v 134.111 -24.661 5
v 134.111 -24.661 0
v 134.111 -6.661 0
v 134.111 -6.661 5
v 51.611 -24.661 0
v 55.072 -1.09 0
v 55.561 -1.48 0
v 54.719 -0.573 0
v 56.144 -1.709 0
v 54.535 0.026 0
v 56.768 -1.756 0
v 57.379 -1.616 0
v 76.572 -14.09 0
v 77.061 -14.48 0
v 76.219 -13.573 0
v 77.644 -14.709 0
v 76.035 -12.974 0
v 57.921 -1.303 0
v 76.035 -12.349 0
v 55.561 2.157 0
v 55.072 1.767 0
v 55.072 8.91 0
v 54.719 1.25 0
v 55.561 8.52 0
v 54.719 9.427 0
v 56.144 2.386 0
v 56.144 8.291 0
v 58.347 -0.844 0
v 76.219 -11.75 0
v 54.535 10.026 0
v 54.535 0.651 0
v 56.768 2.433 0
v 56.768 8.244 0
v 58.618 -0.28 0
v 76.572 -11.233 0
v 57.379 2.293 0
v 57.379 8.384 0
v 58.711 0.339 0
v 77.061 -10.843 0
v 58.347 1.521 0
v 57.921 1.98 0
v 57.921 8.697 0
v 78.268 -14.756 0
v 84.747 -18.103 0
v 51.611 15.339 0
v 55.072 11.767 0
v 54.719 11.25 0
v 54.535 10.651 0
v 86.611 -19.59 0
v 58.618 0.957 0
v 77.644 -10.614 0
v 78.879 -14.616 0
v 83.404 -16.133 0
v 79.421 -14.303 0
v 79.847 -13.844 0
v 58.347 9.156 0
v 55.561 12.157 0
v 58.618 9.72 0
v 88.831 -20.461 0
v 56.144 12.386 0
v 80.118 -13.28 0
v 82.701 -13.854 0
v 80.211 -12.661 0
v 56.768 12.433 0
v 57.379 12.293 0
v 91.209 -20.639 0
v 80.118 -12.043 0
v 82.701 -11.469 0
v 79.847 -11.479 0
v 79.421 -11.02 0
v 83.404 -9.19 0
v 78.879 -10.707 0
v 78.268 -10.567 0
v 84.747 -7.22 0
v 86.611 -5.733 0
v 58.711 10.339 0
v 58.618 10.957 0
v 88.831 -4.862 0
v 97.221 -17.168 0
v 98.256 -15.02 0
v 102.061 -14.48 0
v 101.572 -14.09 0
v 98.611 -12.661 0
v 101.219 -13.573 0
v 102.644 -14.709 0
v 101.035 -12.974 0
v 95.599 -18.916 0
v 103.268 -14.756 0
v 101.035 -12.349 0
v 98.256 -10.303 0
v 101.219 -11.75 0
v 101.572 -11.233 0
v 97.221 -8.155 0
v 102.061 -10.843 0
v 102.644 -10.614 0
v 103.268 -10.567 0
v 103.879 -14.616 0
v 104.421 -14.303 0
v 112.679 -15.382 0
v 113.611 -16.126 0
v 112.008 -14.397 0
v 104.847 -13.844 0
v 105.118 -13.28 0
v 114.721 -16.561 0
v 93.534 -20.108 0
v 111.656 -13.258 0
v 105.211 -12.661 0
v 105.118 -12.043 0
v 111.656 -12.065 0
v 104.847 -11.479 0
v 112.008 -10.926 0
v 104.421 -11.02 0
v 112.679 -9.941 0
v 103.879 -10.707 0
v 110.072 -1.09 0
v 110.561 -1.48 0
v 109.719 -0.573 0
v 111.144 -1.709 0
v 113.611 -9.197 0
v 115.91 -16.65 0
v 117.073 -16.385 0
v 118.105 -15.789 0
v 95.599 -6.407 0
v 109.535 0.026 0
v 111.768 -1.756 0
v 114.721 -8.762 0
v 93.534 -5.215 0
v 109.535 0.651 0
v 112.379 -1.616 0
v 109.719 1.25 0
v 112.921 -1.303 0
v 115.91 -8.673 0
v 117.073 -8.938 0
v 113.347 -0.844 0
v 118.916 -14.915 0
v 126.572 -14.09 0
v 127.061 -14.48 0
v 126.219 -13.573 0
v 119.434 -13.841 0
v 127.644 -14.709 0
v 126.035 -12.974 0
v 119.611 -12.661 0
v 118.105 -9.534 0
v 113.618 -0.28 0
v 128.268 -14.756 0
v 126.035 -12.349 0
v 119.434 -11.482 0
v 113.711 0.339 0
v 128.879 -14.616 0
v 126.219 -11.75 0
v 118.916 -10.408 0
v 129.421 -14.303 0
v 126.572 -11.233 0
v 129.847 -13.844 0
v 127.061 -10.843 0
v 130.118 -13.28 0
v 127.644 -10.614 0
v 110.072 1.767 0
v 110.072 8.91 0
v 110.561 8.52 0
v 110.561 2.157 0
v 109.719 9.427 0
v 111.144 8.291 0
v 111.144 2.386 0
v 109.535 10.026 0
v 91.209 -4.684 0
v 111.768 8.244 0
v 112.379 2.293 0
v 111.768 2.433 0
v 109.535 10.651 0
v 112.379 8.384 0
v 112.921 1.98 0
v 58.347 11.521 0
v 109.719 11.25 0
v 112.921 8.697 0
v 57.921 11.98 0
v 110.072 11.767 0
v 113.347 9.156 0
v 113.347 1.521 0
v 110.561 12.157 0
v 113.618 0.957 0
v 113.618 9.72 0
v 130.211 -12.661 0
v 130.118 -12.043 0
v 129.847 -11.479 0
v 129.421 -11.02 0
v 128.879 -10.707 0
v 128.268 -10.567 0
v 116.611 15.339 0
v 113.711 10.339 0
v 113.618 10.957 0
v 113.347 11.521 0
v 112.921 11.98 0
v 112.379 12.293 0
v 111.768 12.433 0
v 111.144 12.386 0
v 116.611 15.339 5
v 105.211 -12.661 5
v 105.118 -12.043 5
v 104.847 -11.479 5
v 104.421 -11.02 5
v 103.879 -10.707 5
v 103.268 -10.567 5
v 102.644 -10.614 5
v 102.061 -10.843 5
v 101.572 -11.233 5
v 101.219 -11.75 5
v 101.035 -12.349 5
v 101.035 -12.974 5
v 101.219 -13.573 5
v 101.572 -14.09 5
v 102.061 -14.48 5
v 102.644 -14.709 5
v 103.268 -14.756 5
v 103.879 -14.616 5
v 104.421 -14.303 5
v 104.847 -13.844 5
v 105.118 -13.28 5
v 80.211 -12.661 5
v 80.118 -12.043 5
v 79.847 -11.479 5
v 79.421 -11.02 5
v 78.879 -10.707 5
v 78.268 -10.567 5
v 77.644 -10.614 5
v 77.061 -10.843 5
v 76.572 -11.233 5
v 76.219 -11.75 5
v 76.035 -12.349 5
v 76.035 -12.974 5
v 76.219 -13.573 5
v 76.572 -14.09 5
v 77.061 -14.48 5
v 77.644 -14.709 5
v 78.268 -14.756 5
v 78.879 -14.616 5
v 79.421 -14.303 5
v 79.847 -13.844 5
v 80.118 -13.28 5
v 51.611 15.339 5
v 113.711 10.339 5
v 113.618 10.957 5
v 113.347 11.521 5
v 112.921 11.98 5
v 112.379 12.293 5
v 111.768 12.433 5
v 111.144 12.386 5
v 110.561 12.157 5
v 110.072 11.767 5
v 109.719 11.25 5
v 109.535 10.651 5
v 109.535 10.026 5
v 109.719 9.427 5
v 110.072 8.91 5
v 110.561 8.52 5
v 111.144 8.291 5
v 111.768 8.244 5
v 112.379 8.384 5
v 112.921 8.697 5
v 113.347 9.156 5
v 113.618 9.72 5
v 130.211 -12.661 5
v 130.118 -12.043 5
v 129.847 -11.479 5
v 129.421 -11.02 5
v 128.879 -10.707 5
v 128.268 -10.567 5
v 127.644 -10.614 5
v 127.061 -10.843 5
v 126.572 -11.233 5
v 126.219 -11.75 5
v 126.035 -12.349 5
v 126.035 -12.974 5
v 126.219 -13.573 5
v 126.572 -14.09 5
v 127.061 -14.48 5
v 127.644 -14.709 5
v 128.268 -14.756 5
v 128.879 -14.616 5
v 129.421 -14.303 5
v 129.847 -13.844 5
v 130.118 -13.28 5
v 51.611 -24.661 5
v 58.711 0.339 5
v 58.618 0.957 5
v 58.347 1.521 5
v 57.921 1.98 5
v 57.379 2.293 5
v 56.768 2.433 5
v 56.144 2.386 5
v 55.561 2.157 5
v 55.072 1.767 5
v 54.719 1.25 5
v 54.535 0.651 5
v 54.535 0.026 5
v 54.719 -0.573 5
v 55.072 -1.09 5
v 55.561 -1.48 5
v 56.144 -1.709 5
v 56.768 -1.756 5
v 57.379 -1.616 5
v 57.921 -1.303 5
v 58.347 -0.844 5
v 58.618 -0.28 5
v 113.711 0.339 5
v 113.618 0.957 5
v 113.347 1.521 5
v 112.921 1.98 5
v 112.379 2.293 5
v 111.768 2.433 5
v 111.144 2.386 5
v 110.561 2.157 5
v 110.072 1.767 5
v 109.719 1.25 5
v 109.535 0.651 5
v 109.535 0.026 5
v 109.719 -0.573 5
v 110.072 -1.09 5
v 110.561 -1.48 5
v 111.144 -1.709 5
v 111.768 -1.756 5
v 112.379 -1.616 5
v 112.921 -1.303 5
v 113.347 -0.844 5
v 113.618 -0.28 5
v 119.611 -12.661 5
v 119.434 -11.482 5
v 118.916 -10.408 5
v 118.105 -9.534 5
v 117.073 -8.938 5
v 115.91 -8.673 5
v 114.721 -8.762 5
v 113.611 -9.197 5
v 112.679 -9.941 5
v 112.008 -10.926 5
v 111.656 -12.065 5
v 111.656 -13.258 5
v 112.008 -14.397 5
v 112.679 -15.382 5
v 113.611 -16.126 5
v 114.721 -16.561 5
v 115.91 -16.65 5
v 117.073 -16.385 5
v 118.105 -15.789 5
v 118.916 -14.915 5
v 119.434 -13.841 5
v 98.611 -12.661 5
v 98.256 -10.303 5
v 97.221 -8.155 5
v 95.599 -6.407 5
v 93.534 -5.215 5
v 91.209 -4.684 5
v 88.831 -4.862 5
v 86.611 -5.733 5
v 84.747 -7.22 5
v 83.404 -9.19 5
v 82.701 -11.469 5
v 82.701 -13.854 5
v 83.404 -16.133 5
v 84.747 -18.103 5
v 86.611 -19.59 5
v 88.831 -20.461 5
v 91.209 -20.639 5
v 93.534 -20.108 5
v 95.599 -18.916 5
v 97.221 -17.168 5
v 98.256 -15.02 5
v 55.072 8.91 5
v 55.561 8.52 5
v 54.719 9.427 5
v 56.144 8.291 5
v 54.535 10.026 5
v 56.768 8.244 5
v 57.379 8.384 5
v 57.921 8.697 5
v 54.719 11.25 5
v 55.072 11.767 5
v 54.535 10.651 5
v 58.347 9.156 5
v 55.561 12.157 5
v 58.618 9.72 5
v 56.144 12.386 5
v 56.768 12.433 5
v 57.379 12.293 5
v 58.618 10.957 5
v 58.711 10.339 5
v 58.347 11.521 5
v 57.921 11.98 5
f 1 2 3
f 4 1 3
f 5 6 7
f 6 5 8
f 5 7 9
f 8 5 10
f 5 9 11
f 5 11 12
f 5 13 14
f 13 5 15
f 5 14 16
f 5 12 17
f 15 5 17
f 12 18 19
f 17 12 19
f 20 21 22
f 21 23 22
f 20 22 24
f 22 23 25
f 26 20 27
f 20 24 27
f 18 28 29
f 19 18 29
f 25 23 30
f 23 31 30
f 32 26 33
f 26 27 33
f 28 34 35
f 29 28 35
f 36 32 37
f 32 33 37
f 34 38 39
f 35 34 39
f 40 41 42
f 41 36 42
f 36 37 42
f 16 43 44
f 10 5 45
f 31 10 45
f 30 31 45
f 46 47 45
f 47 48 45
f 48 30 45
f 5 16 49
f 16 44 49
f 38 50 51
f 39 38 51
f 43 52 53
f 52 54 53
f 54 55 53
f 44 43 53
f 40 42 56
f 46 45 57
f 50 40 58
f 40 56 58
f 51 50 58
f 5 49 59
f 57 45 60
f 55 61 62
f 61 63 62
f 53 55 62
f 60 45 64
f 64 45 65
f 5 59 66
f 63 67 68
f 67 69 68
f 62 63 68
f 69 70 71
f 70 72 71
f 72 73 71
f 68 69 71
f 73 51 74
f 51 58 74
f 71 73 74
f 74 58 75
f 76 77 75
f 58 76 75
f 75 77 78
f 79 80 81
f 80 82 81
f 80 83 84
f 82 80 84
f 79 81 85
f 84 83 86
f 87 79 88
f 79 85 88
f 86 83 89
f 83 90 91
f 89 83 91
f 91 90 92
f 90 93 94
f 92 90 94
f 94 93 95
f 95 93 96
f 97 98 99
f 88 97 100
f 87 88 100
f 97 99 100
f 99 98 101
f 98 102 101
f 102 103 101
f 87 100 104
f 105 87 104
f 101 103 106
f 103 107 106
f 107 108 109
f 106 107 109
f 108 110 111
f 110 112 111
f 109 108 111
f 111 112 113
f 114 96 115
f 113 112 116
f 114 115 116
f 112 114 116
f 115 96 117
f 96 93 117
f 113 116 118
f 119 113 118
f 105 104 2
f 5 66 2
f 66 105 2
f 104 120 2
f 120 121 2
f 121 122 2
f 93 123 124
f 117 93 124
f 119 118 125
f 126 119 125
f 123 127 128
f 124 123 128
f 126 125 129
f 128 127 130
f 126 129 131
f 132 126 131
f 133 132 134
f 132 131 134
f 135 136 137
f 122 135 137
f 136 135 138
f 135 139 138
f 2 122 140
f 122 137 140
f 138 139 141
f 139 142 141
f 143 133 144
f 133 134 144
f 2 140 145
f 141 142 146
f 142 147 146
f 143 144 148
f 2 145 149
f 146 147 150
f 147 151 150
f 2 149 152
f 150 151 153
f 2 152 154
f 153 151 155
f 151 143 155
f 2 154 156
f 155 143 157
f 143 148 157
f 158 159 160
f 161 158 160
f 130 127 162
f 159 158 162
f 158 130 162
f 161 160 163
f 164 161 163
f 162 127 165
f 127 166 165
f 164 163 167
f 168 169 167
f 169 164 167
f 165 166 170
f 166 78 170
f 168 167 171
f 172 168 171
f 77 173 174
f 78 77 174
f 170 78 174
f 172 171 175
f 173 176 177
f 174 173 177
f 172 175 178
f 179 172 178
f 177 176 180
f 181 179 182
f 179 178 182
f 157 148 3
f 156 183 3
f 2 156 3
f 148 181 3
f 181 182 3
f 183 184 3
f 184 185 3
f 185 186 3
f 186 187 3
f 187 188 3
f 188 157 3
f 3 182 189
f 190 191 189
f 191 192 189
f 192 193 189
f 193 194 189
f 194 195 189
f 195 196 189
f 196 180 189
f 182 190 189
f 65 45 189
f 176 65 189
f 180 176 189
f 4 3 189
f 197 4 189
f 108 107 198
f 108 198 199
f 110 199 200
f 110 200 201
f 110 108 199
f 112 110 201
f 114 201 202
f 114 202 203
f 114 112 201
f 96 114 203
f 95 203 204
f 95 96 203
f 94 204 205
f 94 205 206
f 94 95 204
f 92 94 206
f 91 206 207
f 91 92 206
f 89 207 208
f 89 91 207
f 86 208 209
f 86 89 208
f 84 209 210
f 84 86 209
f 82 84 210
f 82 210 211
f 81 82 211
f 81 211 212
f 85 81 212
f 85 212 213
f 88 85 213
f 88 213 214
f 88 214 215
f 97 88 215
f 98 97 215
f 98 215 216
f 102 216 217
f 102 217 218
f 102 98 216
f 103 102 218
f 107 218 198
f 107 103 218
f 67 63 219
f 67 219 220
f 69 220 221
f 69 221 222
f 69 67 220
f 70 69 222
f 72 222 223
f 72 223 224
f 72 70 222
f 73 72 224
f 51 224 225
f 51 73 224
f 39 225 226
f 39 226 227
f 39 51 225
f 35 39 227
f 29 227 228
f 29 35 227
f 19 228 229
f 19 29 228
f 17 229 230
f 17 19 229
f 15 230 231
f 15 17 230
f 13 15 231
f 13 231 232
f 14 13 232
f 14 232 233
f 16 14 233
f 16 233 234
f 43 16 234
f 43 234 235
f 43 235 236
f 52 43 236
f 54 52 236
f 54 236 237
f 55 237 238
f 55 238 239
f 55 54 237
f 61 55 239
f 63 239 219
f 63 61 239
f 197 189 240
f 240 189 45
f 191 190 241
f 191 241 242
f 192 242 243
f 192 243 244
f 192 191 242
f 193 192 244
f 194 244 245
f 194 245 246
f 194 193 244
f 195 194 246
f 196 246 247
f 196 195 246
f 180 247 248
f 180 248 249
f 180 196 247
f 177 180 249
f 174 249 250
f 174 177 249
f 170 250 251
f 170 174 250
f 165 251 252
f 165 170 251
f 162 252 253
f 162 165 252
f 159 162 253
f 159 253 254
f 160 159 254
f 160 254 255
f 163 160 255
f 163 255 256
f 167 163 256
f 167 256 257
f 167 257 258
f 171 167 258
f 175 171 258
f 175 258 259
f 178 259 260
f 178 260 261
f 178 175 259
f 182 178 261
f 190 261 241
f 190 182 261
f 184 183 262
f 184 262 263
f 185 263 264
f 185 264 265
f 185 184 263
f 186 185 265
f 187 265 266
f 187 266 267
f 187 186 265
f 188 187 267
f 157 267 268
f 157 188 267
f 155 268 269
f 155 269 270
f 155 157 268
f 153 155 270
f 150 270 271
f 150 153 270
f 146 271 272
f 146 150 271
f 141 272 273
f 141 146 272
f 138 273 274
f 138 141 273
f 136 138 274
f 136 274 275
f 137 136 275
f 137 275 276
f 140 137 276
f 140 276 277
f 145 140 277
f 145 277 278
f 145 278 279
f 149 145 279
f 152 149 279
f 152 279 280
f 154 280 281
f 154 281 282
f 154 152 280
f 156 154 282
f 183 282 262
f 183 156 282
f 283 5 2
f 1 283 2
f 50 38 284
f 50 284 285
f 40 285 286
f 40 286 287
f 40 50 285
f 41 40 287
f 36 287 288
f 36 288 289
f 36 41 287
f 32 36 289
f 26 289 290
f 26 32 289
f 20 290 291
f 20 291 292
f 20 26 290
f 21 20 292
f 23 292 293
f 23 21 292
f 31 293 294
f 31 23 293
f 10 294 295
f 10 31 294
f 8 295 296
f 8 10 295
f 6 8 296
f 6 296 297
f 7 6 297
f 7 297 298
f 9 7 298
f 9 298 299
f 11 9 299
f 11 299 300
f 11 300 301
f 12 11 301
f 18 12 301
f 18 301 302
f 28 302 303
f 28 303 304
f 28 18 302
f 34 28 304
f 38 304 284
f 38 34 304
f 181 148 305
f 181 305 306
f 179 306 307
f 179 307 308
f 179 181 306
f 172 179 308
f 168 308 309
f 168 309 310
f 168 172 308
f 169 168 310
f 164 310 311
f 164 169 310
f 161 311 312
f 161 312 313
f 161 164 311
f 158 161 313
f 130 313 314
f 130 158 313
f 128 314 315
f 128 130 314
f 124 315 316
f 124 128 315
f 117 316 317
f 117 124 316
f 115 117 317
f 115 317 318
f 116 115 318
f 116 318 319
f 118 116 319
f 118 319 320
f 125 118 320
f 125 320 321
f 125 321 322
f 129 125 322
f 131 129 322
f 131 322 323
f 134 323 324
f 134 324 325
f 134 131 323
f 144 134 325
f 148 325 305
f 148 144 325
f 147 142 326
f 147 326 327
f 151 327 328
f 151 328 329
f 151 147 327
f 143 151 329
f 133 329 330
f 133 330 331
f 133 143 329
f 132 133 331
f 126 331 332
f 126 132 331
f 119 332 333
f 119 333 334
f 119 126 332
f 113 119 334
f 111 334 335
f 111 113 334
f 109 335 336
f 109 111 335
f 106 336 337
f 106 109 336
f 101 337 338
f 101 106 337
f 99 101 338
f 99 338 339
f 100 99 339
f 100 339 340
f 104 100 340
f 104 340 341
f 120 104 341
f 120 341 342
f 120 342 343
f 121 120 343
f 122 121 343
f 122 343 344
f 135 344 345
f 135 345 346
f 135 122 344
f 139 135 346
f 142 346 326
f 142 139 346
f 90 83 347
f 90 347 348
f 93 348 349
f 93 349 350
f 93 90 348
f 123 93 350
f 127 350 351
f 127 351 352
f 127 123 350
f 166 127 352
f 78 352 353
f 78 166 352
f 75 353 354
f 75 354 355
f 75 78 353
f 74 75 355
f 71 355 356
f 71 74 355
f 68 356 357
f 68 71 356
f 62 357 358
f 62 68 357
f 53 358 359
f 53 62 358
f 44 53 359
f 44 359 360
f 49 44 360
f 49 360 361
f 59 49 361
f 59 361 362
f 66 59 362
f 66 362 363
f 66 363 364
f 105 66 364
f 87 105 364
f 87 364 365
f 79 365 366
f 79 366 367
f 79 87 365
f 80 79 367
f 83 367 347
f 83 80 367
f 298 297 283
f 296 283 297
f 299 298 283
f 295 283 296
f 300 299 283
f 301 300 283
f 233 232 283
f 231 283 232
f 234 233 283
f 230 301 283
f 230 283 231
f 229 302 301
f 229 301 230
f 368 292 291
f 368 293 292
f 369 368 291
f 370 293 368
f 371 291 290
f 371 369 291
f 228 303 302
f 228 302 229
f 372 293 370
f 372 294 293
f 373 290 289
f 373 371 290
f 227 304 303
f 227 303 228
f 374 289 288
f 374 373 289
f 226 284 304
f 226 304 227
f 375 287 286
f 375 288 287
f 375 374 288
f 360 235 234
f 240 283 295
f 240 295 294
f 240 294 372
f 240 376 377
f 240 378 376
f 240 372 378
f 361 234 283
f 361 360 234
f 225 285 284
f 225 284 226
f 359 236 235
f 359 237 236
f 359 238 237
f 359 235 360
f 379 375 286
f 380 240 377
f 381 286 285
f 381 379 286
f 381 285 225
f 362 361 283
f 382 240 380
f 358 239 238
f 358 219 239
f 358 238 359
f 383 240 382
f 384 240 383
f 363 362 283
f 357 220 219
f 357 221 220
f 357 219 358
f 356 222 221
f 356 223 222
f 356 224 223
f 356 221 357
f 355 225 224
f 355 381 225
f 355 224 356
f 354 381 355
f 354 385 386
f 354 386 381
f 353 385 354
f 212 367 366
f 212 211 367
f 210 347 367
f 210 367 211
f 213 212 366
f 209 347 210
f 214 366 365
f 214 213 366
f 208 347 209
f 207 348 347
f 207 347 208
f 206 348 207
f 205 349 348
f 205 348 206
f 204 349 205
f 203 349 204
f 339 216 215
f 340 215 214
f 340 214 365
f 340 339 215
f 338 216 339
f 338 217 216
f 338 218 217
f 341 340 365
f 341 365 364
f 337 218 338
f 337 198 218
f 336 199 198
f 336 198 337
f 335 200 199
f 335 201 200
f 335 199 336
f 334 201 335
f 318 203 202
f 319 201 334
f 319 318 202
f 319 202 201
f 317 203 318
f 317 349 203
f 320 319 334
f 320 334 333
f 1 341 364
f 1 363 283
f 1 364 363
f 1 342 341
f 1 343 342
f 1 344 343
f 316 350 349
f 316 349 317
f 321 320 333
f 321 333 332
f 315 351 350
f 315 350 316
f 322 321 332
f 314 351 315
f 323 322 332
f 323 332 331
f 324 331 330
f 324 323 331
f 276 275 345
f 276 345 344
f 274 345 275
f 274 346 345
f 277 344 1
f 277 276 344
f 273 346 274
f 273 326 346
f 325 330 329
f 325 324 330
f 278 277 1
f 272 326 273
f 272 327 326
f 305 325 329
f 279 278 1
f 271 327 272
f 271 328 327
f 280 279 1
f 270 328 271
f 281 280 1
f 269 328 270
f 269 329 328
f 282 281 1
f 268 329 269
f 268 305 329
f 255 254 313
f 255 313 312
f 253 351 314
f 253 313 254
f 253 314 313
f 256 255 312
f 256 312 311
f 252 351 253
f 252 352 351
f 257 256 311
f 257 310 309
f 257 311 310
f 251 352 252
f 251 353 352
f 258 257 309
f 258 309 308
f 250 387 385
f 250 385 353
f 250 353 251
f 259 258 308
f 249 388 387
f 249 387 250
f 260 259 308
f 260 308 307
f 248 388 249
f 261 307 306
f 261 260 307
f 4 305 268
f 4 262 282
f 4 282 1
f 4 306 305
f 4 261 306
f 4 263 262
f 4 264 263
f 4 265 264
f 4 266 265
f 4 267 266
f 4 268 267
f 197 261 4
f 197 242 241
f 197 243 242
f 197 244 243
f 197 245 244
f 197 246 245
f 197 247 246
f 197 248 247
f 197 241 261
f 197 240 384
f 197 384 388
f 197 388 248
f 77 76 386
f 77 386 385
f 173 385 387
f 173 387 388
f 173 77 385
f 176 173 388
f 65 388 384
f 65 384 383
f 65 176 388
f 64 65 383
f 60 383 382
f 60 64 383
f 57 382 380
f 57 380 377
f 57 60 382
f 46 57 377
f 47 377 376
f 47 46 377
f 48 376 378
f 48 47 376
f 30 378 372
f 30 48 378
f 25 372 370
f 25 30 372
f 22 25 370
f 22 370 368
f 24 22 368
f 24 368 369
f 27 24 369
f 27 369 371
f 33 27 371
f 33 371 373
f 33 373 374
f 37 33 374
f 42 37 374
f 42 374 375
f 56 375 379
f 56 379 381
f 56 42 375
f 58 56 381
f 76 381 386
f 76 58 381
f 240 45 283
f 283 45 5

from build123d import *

# Parameters (mm, degrees)
SKETCH1_R           = 2.1
SKETCH1_R_2         = 4
SKETCH1_R_3         = 8
BOSS_EXTRUDE1_DEPTH = 5


with BuildPart() as part:
    # Sketch1 → Boss-Extrude1 (new body)
    with BuildSketch(Plane.XY):
        Polygon((116.611470678, 15.338509317), (51.611470678, 15.338509317), (51.611470678, -6.661490683), (51.611470678, -24.661490683), (116.611470678, -24.661490683), (134.111470678, -24.661490683), (134.111470678, -6.661490683), align=None)
        with Locations((56.611470678, 10.338509317)):
            Circle(SKETCH1_R, mode=Mode.SUBTRACT)
        with Locations((111.611470678, 10.338509317)):
            Circle(SKETCH1_R, mode=Mode.SUBTRACT)
        with Locations((56.611470678, 0.338509317)):
            Circle(SKETCH1_R, mode=Mode.SUBTRACT)
        with Locations((111.611470678, 0.338509317)):
            Circle(SKETCH1_R, mode=Mode.SUBTRACT)
        with Locations((115.611470678, -12.661490683)):
            Circle(SKETCH1_R_2, mode=Mode.SUBTRACT)
        with Locations((90.611470678, -12.661490683)):
            Circle(SKETCH1_R_3, mode=Mode.SUBTRACT)
        with Locations((78.111470678, -12.661490683)):
            Circle(SKETCH1_R, mode=Mode.SUBTRACT)
        with Locations((103.111470678, -12.661490683)):
            Circle(SKETCH1_R, mode=Mode.SUBTRACT)
        with Locations((128.111470678, -12.661490683)):
            Circle(SKETCH1_R, mode=Mode.SUBTRACT)
    extrude(amount=BOSS_EXTRUDE1_DEPTH)


solid = part.part
